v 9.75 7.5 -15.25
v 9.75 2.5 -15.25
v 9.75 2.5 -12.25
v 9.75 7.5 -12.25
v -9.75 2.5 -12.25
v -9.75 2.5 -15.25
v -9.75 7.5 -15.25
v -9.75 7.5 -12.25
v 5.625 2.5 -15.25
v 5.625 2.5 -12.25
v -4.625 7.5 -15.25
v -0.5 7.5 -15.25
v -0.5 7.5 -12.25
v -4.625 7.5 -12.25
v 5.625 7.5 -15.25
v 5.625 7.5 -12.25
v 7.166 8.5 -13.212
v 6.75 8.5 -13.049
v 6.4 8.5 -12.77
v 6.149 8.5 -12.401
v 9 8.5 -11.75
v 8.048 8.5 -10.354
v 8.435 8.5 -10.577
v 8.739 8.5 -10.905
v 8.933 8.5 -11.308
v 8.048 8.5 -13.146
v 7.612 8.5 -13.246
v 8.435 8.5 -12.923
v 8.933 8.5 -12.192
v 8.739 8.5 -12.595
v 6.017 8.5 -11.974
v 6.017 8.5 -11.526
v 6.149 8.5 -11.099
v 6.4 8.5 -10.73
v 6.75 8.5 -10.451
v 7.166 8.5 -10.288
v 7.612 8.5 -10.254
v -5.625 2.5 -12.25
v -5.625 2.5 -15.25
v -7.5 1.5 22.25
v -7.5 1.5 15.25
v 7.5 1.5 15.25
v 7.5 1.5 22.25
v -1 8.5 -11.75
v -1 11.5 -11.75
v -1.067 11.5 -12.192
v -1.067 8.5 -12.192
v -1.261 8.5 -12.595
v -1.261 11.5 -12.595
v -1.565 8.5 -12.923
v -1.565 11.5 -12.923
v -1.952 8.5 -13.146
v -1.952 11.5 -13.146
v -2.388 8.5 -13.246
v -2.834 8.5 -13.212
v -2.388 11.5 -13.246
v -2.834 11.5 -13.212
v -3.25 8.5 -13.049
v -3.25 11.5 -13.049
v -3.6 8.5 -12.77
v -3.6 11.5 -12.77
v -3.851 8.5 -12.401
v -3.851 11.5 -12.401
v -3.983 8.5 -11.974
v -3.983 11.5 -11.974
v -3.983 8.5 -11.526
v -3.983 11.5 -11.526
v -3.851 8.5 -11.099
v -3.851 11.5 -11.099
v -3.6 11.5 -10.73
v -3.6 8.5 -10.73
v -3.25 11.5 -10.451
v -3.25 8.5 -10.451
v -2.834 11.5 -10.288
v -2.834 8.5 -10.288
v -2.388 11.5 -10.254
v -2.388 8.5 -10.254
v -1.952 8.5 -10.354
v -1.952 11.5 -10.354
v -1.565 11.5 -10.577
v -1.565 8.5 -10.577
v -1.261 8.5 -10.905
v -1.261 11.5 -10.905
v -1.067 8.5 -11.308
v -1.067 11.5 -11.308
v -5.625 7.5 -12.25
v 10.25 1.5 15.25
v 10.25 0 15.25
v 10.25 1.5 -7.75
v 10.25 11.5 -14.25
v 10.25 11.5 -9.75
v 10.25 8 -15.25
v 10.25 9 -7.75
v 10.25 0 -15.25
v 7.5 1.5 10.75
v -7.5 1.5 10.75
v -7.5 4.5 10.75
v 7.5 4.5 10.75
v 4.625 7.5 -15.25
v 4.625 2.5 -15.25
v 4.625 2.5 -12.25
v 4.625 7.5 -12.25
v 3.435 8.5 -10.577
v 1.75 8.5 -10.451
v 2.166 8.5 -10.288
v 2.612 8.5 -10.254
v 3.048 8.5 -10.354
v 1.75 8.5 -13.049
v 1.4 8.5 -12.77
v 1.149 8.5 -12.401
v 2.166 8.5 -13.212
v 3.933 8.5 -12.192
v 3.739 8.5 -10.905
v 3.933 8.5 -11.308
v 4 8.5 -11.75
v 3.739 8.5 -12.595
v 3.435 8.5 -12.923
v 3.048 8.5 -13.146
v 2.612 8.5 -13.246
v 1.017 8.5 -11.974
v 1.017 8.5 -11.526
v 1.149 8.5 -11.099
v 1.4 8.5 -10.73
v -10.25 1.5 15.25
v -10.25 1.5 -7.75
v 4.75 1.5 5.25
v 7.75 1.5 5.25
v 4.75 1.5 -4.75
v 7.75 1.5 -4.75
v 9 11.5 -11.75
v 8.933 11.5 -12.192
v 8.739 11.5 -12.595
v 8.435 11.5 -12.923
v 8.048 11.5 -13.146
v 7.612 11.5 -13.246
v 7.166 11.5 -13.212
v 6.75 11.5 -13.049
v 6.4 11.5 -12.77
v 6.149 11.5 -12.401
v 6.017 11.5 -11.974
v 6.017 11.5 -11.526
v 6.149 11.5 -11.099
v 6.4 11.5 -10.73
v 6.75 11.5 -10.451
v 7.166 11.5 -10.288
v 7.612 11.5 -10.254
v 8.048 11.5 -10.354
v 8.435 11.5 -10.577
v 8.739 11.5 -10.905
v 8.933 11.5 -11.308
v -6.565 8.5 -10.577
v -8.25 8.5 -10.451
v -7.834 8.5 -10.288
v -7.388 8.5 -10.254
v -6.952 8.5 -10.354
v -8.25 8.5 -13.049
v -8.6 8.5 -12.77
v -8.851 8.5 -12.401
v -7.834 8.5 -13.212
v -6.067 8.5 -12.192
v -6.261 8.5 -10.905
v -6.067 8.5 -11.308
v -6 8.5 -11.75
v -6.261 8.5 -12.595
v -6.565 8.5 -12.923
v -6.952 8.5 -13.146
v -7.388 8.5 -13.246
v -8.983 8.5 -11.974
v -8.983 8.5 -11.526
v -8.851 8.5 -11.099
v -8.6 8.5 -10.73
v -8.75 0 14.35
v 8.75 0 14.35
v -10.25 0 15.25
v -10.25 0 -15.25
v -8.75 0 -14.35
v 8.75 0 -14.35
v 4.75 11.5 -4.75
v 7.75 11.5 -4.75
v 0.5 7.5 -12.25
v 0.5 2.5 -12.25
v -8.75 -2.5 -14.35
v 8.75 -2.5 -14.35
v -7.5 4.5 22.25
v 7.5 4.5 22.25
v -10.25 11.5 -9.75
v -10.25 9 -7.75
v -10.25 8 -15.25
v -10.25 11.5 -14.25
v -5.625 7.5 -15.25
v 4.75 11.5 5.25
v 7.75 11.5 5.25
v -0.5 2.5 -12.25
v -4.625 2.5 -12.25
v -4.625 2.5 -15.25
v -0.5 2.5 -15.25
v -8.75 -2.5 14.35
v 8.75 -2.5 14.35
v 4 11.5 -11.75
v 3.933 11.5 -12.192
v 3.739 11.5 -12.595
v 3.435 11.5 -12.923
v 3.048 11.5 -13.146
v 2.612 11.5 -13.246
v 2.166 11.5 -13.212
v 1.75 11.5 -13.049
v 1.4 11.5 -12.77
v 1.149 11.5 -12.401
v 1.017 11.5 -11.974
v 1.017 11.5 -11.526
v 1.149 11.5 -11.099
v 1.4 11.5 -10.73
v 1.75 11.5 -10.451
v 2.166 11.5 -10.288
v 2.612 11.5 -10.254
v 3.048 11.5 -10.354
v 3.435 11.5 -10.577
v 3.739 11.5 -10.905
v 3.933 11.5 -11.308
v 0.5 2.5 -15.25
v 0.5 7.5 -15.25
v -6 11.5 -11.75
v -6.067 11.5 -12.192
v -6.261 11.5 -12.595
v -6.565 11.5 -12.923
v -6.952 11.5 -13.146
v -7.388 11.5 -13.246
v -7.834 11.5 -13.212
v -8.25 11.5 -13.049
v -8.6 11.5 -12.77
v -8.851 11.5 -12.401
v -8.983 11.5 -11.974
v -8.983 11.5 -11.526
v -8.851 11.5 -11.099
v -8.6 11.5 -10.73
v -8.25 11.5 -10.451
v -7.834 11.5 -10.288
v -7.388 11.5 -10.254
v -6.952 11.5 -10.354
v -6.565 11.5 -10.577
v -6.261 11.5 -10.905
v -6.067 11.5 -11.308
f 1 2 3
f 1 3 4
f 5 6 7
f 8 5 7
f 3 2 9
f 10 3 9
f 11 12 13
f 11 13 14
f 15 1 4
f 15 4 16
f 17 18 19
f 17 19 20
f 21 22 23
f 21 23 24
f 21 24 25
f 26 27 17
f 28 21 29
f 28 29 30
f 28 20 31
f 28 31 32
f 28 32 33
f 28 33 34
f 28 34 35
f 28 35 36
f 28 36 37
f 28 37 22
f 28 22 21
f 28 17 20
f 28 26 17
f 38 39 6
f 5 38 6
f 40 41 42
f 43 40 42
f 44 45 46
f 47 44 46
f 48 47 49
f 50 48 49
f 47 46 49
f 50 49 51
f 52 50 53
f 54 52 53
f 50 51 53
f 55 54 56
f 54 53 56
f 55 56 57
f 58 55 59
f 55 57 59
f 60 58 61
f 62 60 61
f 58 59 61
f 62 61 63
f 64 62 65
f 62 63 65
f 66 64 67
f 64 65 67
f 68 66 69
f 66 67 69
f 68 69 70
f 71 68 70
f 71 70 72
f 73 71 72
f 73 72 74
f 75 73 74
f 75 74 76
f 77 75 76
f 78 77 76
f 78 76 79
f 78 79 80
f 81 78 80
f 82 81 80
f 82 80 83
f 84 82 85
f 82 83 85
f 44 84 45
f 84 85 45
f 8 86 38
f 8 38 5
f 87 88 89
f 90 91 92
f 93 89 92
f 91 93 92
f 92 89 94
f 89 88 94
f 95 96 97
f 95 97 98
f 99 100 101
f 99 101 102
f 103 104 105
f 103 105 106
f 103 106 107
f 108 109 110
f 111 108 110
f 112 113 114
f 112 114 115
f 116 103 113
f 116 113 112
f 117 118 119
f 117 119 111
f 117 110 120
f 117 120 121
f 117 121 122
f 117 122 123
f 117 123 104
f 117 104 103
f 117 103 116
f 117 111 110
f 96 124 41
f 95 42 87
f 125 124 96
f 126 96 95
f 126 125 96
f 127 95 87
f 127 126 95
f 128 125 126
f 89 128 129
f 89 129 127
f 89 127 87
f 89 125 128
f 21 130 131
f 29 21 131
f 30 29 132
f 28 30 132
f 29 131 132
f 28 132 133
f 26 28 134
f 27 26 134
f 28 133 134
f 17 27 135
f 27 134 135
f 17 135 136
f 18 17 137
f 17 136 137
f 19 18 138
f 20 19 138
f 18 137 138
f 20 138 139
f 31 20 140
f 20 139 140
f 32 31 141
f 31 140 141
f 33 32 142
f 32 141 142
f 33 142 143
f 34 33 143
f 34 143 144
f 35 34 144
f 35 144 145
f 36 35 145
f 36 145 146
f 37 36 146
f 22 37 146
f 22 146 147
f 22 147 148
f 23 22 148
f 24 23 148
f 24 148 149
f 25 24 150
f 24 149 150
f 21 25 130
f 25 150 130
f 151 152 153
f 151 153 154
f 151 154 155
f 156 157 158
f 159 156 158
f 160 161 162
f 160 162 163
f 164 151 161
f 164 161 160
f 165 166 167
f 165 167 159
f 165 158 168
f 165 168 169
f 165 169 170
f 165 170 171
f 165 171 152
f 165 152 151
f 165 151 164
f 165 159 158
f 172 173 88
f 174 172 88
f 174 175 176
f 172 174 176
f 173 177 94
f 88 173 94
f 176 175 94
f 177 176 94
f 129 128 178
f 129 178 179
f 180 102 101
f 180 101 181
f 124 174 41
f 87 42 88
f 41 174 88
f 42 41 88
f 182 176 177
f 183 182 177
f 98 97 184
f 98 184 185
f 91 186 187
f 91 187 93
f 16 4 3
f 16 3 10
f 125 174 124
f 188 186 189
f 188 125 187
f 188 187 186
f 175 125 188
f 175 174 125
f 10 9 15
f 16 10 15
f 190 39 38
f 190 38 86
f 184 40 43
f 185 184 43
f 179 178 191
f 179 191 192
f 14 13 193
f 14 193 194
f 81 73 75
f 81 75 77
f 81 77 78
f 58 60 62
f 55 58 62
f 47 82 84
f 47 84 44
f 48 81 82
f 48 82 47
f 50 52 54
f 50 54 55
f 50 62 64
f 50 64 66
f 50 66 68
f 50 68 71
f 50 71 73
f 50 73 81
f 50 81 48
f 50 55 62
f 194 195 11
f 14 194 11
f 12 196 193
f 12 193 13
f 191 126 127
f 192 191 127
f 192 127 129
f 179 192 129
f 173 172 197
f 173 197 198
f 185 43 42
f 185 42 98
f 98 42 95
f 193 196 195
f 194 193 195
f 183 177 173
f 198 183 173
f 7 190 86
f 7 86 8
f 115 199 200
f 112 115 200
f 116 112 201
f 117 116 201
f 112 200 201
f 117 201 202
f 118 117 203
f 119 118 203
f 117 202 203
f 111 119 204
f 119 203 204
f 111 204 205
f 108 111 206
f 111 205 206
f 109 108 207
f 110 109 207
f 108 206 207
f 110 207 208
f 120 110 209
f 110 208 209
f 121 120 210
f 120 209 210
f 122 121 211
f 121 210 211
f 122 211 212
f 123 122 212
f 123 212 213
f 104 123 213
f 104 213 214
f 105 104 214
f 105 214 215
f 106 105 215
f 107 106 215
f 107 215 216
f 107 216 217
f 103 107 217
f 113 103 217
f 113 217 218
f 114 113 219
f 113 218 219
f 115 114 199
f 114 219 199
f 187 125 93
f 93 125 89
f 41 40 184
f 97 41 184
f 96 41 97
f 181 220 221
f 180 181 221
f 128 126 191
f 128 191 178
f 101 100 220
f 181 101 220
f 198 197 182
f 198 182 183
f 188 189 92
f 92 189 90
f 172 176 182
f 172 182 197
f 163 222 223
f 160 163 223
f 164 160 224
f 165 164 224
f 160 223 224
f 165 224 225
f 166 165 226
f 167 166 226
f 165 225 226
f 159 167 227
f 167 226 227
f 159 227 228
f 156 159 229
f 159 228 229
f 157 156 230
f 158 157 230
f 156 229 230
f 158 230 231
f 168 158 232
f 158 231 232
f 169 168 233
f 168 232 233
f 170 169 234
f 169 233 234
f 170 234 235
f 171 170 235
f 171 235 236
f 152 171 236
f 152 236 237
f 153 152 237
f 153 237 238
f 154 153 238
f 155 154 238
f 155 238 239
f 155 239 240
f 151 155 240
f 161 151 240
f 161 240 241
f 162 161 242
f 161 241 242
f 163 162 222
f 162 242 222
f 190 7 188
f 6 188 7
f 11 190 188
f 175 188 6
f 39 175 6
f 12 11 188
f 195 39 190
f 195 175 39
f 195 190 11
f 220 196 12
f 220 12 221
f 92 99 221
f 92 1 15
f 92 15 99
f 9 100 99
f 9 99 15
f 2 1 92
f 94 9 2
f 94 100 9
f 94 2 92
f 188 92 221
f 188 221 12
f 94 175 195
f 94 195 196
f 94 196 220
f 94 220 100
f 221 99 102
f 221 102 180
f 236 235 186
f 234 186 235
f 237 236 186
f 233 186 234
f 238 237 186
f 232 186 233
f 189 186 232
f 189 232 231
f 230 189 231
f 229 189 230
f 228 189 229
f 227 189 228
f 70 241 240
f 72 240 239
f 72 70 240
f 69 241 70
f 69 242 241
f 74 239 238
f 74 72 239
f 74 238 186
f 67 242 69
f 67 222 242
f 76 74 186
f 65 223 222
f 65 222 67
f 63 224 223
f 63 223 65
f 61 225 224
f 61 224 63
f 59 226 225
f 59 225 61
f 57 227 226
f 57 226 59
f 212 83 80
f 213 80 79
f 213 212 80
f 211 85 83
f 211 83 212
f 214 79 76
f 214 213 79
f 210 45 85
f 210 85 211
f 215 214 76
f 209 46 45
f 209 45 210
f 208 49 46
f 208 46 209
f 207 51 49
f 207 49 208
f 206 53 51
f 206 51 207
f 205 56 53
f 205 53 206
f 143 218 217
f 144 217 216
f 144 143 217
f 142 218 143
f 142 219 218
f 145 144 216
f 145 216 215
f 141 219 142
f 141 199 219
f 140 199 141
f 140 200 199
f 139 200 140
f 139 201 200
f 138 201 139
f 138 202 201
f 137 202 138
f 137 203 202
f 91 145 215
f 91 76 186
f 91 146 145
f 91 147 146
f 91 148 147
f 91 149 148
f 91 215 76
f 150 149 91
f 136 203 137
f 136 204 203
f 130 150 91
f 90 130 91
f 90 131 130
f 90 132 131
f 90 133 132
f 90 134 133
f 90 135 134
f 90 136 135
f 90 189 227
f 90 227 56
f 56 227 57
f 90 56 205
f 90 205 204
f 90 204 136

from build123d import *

# Parameters (mm, degrees)
SKETCH1_W           = 20.5
SKETCH1_H           = 30.5
BOSS_EXTRUDE1_DEPTH = 1.5
SKETCH2_W           = 15
SKETCH2_H           = 11.5
BOSS_EXTRUDE2_DEPTH = 3
SKETCH3_W           = 3
SKETCH3_H           = 10
BOSS_EXTRUDE3_DEPTH = 10
SKETCH4_W           = 20.5
SKETCH4_H           = 7.5
BOSS_EXTRUDE4_DEPTH = 10
SKETCH5_W           = 4.125
SKETCH5_H           = 5
CUT_EXTRUDE1_DEPTH  = 3
CHAMFER1_SIZE       = 2.5
CHAMFER1_SIZE2      = 2
CHAMFER2_SIZE       = 3.5
CHAMFER2_SIZE2      = 1
SKETCH6_R           = 1.5
CUT_EXTRUDE2_DEPTH  = 3
SKETCH8_W           = 17.5
SKETCH8_H           = 28.7
BOSS_EXTRUDE5_DEPTH = 2.5


with BuildPart() as part:
    # Sketch1 → Boss-Extrude1 (new body)
    with BuildSketch(Plane(origin=(0, 0, 0), x_dir=(1, 0, 0), z_dir=(0, 1, 0))):
        Rectangle(SKETCH1_W, SKETCH1_H)
    extrude(amount=BOSS_EXTRUDE1_DEPTH)

    # Sketch2 → Boss-Extrude2 (add)
    with BuildSketch(Plane(origin=(0, 1.5, 0), x_dir=(1, 0, 0), z_dir=(0, 1, 0))):
        with Locations((0, -16.5)):
            Rectangle(SKETCH2_W, SKETCH2_H)
    extrude(amount=BOSS_EXTRUDE2_DEPTH)

    # Sketch3 → Boss-Extrude3 (add)
    with BuildSketch(Plane(origin=(0, 1.5, 0), x_dir=(1, 0, 0), z_dir=(0, 1, 0))):
        with Locations((6.25, -0.25)):
            Rectangle(SKETCH3_W, SKETCH3_H)
    extrude(amount=BOSS_EXTRUDE3_DEPTH)

    # Sketch4 → Boss-Extrude4 (add)
    with BuildSketch(Plane(origin=(0, 1.5, 0), x_dir=(1, 0, 0), z_dir=(0, 1, 0))):
        with Locations((0, 11.5)):
            Rectangle(SKETCH4_W, SKETCH4_H)
    extrude(amount=BOSS_EXTRUDE4_DEPTH)

    # Sketch5 → Cut-Extrude1 (cut)
    with BuildSketch(Plane(origin=(0, 0, -15.25), x_dir=(-1, 0, 0), z_dir=(0, 0, -1))):
        with Locations((-7.6875, 5)):
            Rectangle(SKETCH5_W, SKETCH5_H)
        with Locations((-2.5625, 5)):
            Rectangle(SKETCH5_W, SKETCH5_H)
        with Locations((2.5625, 5)):
            Rectangle(SKETCH5_W, SKETCH5_H)
        with Locations((7.6875, 5)):
            Rectangle(SKETCH5_W, SKETCH5_H)
    extrude(amount=-CUT_EXTRUDE1_DEPTH, mode=Mode.SUBTRACT)

    # Chamfer1
    chamfer1_edges = [part.edges().sort_by_distance(p)[0] for p in [
        (0, 11.5, -7.75),
    ]]
    chamfer1_side = [part.faces().sort_by_distance(p)[0] for p in [
        (0, 6.5, -7.75),
    ]]
    chamfer(chamfer1_edges, length=CHAMFER1_SIZE, length2=CHAMFER1_SIZE2, reference=chamfer1_side[0])

    # Chamfer2
    chamfer2_edges = [part.edges().sort_by_distance(p)[0] for p in [
        (0, 11.5, -15.25),
    ]]
    chamfer2_side = [part.faces().sort_by_distance(p)[0] for p in [
        (0, 6.153752039, -15.25),
    ]]
    chamfer(chamfer2_edges, length=CHAMFER2_SIZE, length2=CHAMFER2_SIZE2, reference=chamfer2_side[0])

    # Sketch6 → Cut-Extrude2 (cut)
    with BuildSketch(Plane(origin=(0, 11.5, 0), x_dir=(1, 0, 0), z_dir=(0, 1, 0))):
        with Locations((-7.5, 11.75)):
            Circle(SKETCH6_R)
        with Locations((-2.5, 11.75)):
            Circle(SKETCH6_R)
        with Locations((2.5, 11.75)):
            Circle(SKETCH6_R)
        with Locations((7.5, 11.75)):
            Circle(SKETCH6_R)
    extrude(amount=-CUT_EXTRUDE2_DEPTH, mode=Mode.SUBTRACT)

    # Sketch8 → Boss-Extrude5 (add)
    with BuildSketch(Plane.XZ):
        Rectangle(SKETCH8_W, SKETCH8_H)
    extrude(amount=BOSS_EXTRUDE5_DEPTH)


solid = part.part
